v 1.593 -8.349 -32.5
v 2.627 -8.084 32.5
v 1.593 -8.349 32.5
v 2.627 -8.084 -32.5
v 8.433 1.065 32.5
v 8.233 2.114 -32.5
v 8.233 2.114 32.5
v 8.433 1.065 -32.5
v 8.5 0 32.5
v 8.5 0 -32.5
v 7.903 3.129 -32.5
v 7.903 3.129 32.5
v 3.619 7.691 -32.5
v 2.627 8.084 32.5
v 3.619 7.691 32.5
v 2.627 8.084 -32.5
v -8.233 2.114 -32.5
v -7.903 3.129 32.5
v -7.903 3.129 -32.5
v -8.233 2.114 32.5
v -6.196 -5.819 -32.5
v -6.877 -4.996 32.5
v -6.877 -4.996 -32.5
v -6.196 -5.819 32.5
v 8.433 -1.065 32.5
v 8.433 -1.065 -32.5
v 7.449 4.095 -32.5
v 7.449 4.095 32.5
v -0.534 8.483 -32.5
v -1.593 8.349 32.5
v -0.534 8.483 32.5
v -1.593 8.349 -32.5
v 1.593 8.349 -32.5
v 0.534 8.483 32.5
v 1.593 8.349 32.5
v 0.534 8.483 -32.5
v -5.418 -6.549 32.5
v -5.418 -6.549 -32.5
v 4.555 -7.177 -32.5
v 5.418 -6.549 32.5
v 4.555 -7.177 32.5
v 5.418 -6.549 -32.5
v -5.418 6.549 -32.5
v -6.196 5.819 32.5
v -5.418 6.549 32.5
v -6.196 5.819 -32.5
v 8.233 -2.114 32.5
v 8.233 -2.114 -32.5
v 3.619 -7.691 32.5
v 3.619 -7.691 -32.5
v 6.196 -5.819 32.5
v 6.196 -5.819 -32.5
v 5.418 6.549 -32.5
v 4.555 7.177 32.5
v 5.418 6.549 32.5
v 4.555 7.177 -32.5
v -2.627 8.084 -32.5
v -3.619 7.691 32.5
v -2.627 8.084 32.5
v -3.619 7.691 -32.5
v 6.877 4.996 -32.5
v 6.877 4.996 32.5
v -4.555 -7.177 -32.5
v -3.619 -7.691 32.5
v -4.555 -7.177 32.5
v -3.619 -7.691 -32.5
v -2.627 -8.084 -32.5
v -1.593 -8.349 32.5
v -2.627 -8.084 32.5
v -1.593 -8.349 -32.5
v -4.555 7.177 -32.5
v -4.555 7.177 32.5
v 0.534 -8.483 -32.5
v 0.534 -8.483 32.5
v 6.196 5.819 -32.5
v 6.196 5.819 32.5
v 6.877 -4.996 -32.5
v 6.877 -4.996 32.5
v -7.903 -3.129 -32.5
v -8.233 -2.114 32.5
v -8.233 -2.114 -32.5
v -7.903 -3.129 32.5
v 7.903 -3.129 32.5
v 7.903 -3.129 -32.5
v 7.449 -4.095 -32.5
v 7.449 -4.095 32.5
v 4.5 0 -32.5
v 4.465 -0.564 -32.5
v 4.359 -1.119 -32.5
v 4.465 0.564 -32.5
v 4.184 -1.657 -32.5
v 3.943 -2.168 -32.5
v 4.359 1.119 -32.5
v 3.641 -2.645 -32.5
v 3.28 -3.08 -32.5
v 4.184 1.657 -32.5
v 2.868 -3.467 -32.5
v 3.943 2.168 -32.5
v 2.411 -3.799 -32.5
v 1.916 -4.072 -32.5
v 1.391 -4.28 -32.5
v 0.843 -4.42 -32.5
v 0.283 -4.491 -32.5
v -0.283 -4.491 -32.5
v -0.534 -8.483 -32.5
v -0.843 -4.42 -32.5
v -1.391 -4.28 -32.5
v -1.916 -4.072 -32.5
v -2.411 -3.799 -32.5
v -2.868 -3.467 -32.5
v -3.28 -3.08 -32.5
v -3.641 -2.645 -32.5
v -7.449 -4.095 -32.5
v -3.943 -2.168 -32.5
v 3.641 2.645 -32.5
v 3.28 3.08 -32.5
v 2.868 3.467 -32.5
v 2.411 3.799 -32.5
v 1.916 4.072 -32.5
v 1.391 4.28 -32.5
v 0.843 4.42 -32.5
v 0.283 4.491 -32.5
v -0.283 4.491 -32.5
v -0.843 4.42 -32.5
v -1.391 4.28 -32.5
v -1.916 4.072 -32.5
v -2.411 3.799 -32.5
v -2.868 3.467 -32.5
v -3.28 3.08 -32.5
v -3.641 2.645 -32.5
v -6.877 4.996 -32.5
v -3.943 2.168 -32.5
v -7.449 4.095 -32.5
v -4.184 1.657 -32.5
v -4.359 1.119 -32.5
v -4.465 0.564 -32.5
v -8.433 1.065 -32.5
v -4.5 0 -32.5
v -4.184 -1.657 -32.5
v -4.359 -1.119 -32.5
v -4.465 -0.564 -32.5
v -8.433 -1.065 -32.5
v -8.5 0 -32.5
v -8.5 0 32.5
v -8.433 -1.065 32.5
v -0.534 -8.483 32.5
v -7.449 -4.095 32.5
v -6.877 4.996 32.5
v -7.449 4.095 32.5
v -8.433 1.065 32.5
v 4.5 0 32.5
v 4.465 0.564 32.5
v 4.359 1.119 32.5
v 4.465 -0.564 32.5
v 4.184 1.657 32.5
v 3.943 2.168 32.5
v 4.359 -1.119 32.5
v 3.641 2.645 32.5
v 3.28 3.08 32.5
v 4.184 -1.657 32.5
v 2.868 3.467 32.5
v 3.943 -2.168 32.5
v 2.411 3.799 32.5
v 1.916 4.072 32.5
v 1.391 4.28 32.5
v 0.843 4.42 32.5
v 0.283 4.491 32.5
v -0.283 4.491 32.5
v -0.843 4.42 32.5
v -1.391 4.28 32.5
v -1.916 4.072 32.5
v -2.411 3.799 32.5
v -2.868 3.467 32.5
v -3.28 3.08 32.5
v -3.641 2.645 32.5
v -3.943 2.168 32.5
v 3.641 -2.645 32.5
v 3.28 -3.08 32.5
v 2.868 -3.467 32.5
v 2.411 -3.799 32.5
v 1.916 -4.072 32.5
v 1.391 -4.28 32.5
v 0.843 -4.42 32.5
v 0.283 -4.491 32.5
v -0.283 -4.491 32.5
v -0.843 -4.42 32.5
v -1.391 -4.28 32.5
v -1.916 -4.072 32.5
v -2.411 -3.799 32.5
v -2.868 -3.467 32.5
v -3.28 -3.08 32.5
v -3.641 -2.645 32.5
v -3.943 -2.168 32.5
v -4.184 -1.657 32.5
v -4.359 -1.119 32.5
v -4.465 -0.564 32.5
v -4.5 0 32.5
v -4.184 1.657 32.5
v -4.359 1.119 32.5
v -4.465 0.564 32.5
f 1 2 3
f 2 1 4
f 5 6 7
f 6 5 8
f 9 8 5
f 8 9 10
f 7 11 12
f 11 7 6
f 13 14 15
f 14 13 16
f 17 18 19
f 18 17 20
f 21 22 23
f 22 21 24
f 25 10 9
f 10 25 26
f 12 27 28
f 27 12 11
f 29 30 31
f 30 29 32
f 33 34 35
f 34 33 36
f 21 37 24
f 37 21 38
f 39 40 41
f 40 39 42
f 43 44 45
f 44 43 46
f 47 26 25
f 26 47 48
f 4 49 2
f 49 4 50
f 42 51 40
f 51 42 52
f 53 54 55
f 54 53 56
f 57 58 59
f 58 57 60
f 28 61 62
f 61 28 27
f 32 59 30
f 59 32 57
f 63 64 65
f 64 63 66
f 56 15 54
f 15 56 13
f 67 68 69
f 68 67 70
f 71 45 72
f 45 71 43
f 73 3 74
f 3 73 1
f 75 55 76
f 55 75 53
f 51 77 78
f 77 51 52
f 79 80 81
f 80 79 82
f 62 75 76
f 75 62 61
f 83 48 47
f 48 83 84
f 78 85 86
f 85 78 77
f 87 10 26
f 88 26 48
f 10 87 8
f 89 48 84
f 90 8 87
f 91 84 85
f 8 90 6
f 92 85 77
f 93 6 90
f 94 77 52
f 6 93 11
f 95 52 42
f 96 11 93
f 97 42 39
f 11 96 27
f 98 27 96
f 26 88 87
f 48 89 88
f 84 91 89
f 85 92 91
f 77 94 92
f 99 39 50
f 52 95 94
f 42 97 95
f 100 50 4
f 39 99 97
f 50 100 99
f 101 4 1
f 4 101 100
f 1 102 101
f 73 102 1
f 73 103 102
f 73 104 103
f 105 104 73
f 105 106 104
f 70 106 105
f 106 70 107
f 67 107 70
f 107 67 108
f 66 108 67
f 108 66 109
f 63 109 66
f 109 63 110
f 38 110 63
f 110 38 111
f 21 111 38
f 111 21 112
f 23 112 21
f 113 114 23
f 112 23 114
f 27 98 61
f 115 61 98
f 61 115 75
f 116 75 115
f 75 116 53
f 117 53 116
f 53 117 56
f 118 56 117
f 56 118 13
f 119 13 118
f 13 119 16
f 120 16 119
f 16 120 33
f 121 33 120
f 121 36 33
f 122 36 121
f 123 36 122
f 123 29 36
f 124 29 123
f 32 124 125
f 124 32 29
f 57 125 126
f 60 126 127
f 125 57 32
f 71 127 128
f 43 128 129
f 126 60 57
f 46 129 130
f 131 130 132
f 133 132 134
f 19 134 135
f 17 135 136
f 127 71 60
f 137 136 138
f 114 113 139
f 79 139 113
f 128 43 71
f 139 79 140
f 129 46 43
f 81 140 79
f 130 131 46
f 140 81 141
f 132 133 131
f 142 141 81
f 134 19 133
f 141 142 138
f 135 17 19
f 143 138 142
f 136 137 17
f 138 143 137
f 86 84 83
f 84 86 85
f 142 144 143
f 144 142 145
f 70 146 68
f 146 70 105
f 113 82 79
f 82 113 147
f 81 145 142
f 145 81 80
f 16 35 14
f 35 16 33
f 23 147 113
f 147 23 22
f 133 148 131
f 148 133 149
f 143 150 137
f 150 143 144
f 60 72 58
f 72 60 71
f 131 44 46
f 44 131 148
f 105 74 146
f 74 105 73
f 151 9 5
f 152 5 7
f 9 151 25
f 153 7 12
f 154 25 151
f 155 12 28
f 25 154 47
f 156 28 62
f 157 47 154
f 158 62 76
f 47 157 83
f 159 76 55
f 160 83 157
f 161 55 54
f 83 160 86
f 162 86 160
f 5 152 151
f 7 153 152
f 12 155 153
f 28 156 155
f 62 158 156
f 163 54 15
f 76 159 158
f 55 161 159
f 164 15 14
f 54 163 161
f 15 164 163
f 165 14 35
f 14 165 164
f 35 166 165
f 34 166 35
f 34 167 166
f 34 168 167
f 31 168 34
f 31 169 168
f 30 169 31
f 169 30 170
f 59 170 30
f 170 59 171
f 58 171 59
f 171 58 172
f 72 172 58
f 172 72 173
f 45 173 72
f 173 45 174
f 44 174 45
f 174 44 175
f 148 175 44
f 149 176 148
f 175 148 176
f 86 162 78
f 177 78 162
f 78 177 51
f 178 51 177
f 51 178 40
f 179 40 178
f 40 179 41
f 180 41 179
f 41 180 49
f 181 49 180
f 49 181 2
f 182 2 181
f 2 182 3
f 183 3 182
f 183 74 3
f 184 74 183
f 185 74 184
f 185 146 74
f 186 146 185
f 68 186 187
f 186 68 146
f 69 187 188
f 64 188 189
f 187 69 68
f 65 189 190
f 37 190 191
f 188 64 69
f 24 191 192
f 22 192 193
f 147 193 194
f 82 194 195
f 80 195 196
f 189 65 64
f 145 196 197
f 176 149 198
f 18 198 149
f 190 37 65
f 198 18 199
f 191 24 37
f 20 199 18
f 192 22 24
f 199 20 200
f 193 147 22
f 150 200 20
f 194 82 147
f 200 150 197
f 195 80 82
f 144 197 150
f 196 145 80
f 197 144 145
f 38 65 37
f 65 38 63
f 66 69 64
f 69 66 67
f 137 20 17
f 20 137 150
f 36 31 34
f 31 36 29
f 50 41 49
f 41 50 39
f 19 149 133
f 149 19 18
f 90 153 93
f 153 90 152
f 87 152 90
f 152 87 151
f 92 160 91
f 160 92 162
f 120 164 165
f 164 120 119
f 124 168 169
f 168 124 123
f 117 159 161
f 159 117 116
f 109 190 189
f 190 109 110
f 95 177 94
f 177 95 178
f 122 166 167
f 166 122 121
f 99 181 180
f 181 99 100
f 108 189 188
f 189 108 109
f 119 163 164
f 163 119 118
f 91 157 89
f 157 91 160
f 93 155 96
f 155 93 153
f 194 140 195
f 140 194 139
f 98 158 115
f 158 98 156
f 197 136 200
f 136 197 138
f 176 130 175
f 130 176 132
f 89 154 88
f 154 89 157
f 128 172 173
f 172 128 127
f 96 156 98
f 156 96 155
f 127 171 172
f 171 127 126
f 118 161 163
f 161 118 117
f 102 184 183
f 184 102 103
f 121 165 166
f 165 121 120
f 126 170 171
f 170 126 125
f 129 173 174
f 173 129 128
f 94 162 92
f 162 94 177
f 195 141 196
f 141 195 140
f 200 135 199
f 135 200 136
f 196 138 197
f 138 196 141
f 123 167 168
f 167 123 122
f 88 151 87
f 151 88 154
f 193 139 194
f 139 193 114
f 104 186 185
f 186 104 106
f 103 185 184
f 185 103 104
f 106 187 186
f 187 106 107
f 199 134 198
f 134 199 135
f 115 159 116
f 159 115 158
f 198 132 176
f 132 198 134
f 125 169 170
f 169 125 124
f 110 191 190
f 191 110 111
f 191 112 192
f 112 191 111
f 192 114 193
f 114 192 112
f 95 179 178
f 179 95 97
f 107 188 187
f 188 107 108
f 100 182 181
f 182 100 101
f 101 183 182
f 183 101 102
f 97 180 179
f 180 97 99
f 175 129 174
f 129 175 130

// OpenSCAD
$fn = 50;


difference() {
	union() {
		translate(v = [0, 0, -32.5000000000]) {
			cylinder(h = 65, r = 8.5000000000);
		}
	}
	union() {
		translate(v = [0, 0, -100.0000000000]) {
			cylinder(h = 200, r = 4.5000000000);
		}
	}
}
